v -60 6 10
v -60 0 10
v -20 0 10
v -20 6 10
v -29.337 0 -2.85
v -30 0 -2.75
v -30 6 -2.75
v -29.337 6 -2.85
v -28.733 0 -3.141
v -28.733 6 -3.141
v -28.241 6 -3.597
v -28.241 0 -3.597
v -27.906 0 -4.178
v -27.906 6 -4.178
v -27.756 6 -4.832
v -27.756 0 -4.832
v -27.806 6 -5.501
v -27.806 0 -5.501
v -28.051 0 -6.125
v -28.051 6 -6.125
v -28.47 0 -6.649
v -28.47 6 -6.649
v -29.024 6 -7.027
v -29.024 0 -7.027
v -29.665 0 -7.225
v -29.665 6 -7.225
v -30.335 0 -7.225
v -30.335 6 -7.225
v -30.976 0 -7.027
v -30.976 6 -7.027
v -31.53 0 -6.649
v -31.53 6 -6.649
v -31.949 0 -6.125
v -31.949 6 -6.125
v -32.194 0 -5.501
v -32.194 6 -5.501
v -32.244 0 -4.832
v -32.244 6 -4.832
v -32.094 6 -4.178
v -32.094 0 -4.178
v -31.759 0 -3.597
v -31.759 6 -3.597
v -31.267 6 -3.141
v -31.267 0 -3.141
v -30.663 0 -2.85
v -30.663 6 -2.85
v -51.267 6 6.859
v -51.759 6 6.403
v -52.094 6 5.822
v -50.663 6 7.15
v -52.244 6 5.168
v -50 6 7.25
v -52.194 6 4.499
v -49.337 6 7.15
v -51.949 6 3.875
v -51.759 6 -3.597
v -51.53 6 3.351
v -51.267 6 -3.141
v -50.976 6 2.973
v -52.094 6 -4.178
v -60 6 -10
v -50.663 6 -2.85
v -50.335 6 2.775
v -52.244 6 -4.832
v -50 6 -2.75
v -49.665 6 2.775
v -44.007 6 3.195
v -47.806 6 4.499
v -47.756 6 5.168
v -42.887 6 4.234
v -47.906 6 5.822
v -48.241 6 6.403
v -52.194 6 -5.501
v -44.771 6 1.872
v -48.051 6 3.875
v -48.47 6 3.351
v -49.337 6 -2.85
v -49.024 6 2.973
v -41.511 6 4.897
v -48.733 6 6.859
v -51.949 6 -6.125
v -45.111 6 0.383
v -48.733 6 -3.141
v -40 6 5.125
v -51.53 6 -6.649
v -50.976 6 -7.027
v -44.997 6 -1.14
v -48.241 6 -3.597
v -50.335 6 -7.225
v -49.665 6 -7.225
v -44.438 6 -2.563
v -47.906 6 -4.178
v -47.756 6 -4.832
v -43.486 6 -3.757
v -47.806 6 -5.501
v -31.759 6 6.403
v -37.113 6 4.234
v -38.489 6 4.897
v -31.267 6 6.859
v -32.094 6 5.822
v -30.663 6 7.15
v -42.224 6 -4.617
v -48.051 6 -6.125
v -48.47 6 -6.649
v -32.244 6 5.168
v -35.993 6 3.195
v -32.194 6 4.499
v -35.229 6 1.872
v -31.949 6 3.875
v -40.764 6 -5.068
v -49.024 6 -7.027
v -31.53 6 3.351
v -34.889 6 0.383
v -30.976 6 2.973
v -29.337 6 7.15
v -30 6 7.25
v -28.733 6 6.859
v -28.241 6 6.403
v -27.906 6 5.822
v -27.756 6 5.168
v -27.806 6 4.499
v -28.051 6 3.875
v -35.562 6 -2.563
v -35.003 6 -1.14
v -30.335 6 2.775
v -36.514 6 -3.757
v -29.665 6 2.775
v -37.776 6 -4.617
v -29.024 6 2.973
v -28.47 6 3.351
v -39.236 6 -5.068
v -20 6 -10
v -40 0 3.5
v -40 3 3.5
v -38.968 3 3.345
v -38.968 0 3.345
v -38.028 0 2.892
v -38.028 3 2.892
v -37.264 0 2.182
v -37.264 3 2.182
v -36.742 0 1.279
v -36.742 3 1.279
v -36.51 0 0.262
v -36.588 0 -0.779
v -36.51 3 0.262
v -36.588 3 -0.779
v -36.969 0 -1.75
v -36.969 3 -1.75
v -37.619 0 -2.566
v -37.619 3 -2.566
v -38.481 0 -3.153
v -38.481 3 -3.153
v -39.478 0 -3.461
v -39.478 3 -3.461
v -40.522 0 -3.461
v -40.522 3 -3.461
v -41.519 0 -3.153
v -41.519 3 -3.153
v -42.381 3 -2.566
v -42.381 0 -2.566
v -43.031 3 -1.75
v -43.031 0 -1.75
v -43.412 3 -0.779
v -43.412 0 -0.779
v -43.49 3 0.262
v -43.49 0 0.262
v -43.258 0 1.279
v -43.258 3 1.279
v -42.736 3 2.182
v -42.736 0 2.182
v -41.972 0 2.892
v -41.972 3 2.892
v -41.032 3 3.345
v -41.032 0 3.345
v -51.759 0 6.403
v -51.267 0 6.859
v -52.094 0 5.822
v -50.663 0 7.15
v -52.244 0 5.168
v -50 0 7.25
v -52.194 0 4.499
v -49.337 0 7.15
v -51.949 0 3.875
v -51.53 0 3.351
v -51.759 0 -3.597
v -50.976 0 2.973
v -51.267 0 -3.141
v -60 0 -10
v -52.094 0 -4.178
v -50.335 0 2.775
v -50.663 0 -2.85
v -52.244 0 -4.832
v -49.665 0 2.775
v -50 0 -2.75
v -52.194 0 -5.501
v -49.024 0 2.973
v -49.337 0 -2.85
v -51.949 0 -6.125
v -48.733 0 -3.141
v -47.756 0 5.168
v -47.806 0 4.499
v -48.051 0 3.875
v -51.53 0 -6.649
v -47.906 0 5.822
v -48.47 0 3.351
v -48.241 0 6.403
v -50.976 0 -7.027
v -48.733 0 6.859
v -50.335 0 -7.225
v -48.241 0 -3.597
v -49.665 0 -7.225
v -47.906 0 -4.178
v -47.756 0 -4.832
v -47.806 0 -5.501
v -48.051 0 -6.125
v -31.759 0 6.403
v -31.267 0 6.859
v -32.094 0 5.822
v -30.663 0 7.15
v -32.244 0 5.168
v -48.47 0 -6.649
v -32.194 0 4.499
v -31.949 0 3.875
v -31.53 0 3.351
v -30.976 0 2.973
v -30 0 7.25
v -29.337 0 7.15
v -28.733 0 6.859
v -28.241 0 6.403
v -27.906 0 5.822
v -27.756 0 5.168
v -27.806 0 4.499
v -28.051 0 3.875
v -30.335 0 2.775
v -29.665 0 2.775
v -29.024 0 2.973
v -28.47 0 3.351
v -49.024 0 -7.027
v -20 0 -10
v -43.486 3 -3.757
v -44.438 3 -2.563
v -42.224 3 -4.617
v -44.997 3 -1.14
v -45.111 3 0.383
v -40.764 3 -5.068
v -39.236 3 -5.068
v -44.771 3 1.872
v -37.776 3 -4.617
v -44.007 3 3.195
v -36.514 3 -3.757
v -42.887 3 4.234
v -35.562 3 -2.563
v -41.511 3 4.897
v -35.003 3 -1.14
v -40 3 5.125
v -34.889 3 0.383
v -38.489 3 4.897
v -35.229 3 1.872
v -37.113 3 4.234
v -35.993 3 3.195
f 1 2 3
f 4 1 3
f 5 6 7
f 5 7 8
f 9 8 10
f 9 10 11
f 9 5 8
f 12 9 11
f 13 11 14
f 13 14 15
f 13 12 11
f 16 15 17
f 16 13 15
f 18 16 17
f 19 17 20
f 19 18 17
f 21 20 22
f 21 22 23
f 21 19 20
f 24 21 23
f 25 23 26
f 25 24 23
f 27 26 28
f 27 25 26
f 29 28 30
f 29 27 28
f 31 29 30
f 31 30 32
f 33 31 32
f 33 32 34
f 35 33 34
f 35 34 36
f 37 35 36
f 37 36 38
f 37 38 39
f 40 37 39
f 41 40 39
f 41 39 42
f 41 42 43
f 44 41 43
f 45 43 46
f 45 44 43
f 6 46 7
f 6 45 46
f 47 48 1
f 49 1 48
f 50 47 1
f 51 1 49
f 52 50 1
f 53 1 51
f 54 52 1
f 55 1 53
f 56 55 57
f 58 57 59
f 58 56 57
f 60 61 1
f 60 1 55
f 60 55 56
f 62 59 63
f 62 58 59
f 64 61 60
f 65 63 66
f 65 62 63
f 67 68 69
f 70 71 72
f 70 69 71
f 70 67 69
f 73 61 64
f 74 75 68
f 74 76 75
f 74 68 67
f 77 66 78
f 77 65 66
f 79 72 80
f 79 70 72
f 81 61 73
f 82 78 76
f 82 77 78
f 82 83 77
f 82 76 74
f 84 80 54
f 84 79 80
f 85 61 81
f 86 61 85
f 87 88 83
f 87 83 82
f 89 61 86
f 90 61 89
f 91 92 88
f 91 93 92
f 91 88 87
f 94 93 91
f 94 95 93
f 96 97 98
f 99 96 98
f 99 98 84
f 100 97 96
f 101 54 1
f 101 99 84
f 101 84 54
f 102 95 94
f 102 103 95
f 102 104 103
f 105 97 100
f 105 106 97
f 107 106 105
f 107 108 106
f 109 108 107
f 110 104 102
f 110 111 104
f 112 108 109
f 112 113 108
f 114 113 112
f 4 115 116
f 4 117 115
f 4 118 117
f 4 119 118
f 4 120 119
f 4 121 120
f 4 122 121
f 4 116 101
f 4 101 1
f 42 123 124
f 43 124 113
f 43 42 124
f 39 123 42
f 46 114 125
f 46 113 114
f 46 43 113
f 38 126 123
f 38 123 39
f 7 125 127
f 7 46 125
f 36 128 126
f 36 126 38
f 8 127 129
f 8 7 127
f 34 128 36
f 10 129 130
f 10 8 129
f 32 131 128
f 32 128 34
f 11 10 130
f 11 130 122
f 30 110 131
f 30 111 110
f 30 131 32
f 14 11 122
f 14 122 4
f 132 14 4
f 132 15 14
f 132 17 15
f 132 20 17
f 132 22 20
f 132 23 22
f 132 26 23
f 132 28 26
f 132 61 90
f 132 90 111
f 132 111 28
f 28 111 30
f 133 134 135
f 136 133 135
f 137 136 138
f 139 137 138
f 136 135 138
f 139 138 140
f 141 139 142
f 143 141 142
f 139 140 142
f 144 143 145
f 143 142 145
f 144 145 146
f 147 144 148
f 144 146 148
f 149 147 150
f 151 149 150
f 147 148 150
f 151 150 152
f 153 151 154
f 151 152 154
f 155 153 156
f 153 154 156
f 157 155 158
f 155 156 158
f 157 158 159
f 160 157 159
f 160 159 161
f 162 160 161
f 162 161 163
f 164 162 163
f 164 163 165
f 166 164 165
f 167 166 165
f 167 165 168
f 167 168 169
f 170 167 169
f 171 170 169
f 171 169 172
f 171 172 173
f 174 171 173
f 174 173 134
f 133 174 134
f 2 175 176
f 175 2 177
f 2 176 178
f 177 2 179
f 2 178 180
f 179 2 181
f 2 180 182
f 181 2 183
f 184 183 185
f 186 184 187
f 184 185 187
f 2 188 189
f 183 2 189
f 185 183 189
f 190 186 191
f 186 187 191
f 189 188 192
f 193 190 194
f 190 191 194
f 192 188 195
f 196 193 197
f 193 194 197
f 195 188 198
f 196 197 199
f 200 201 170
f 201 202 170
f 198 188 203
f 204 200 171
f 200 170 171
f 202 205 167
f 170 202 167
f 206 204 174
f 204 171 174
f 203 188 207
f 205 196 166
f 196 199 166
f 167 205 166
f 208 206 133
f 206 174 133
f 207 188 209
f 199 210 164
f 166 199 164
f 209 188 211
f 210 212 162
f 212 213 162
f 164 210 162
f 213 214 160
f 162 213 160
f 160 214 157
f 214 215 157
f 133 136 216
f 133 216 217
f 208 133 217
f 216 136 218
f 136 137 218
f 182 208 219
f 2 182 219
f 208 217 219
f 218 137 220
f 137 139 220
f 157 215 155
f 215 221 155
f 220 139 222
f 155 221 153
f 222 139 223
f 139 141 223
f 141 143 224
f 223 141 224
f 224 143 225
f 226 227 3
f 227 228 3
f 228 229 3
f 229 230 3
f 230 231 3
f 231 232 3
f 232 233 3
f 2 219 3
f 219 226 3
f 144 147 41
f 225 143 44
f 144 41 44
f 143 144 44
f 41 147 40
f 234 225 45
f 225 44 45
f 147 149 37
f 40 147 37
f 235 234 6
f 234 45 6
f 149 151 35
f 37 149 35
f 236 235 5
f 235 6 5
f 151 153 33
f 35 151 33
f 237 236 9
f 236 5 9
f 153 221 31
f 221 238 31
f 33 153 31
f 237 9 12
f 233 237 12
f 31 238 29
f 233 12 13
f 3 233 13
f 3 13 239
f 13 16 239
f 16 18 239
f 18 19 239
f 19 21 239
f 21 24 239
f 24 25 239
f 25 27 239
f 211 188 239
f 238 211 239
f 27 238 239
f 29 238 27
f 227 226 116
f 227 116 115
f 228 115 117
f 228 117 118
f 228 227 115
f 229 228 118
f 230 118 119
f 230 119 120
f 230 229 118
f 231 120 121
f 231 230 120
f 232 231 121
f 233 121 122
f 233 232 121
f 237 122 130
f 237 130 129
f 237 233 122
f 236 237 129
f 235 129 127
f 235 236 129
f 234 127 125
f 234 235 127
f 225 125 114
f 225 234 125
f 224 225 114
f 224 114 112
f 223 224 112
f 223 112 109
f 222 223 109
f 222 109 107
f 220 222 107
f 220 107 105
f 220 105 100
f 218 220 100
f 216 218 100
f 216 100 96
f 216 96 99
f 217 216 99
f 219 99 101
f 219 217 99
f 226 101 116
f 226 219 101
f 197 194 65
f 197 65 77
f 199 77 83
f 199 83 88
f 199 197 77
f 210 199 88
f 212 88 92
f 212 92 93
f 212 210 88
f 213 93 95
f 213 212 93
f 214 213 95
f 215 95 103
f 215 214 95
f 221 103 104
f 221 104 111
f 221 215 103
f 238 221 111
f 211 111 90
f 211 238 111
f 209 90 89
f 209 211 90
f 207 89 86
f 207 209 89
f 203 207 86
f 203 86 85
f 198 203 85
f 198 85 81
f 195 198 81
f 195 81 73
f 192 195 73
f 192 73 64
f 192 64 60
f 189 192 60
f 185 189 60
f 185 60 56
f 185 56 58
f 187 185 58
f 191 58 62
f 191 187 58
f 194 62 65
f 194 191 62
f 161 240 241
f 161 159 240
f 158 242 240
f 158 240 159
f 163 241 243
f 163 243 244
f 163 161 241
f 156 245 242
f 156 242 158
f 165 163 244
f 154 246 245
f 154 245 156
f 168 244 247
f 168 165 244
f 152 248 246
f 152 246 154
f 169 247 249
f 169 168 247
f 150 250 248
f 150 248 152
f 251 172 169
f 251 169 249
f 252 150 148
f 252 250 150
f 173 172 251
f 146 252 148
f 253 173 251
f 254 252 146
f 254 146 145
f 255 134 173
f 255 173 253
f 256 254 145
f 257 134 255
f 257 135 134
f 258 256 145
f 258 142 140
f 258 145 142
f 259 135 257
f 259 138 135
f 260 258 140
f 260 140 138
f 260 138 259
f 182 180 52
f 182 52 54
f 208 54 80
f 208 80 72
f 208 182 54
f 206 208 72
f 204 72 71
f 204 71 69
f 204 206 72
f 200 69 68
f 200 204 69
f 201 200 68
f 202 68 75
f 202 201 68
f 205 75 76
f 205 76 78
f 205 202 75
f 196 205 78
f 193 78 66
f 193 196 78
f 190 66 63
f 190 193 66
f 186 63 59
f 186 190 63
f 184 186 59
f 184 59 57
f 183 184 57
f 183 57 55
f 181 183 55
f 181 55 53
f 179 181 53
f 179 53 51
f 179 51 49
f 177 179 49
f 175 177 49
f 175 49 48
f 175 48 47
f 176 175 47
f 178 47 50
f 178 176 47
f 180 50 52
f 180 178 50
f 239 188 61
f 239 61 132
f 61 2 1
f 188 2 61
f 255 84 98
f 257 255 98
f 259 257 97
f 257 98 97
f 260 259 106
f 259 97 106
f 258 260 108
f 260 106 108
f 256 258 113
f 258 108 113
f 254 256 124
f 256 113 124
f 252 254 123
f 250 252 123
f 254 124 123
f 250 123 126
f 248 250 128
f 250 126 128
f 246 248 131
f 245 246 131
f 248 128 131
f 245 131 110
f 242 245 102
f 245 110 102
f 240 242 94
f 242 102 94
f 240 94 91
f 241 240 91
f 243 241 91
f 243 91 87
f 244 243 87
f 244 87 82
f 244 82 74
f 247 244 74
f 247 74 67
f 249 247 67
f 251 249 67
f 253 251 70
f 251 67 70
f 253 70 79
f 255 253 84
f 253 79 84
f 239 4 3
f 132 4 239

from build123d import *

# Parameters (mm, degrees)
SKETCH_2_W          = 120
SKETCH_2_H          = 20
SKETCH_2_R          = 2.25
EXTRUDE_1_DEPTH     = 6
SKETCH_3_W          = 80
SKETCH_3_H          = 20
CUT_EXTRUDE_1_DEPTH = 62.12282716
SKETCH_4_R          = 5.125
CUT_EXTRUDE_2_DEPTH = 3
SKETCH_5_R          = 3.5
CUT_EXTRUDE_3_DEPTH = 61.901559914


with BuildPart() as part:
    # Эскиз2 → Бобышка-Вытянуть1 (new body)
    with BuildSketch(Plane(origin=(0, 0, 0), x_dir=(1, 0, 0), z_dir=(0, 1, 0))):
        Rectangle(SKETCH_2_W, SKETCH_2_H)
        with Locations(Location((-50, 5, 0), (0, 0, 270))):
            Circle(SKETCH_2_R, mode=Mode.SUBTRACT)
        with Locations(Location((-30, 5, 0), (0, 0, 270))):
            Circle(SKETCH_2_R, mode=Mode.SUBTRACT)
        with Locations(Location((-10, 5, 0), (0, 0, 270))):
            Circle(SKETCH_2_R, mode=Mode.SUBTRACT)
        with Locations(Location((30, 5, 0), (0, 0, 270))):
            Circle(SKETCH_2_R, mode=Mode.SUBTRACT)
        with Locations(Location((-30, -5, 0), (0, 0, 270))):
            Circle(SKETCH_2_R, mode=Mode.SUBTRACT)
        with Locations(Location((10, -5, 0), (0, 0, 270))):
            Circle(SKETCH_2_R, mode=Mode.SUBTRACT)
        with Locations(Location((50, -5, 0), (0, 0, 270))):
            Circle(SKETCH_2_R, mode=Mode.SUBTRACT)
        with Locations(Location((-50, -5, 0), (0, 0, 270))):
            Circle(SKETCH_2_R, mode=Mode.SUBTRACT)
    extrude(amount=EXTRUDE_1_DEPTH)

    # Эскиз3 → Вырез-Вытянуть1 (cut, through all)
    with BuildSketch(Plane(origin=(0, 6, 0), x_dir=(1, 0, 0), z_dir=(0, 1, 0))):
        with Locations((20, 0)):
            Rectangle(SKETCH_3_W, SKETCH_3_H)
    extrude(amount=-CUT_EXTRUDE_1_DEPTH, mode=Mode.SUBTRACT)

    # Эскиз4 → Вырез-Вытянуть2 (cut)
    with BuildSketch(Plane(origin=(0, 6, 0), x_dir=(1, 0, 0), z_dir=(0, 1, 0))):
        with Locations(Location((-40, 0, 0), (0, 0, 270))):
            Circle(SKETCH_4_R)
    extrude(amount=-CUT_EXTRUDE_2_DEPTH, mode=Mode.SUBTRACT)

    # Эскиз5 → Вырез-Вытянуть3 (cut, through all)
    with BuildSketch(Plane(origin=(0, 3, 0), x_dir=(1, 0, 0), z_dir=(0, 1, 0))):
        with Locations(Location((-40, 0, 0), (0, 0, 270))):
            Circle(SKETCH_5_R)
    extrude(amount=-CUT_EXTRUDE_3_DEPTH, mode=Mode.SUBTRACT)


solid = part.part
